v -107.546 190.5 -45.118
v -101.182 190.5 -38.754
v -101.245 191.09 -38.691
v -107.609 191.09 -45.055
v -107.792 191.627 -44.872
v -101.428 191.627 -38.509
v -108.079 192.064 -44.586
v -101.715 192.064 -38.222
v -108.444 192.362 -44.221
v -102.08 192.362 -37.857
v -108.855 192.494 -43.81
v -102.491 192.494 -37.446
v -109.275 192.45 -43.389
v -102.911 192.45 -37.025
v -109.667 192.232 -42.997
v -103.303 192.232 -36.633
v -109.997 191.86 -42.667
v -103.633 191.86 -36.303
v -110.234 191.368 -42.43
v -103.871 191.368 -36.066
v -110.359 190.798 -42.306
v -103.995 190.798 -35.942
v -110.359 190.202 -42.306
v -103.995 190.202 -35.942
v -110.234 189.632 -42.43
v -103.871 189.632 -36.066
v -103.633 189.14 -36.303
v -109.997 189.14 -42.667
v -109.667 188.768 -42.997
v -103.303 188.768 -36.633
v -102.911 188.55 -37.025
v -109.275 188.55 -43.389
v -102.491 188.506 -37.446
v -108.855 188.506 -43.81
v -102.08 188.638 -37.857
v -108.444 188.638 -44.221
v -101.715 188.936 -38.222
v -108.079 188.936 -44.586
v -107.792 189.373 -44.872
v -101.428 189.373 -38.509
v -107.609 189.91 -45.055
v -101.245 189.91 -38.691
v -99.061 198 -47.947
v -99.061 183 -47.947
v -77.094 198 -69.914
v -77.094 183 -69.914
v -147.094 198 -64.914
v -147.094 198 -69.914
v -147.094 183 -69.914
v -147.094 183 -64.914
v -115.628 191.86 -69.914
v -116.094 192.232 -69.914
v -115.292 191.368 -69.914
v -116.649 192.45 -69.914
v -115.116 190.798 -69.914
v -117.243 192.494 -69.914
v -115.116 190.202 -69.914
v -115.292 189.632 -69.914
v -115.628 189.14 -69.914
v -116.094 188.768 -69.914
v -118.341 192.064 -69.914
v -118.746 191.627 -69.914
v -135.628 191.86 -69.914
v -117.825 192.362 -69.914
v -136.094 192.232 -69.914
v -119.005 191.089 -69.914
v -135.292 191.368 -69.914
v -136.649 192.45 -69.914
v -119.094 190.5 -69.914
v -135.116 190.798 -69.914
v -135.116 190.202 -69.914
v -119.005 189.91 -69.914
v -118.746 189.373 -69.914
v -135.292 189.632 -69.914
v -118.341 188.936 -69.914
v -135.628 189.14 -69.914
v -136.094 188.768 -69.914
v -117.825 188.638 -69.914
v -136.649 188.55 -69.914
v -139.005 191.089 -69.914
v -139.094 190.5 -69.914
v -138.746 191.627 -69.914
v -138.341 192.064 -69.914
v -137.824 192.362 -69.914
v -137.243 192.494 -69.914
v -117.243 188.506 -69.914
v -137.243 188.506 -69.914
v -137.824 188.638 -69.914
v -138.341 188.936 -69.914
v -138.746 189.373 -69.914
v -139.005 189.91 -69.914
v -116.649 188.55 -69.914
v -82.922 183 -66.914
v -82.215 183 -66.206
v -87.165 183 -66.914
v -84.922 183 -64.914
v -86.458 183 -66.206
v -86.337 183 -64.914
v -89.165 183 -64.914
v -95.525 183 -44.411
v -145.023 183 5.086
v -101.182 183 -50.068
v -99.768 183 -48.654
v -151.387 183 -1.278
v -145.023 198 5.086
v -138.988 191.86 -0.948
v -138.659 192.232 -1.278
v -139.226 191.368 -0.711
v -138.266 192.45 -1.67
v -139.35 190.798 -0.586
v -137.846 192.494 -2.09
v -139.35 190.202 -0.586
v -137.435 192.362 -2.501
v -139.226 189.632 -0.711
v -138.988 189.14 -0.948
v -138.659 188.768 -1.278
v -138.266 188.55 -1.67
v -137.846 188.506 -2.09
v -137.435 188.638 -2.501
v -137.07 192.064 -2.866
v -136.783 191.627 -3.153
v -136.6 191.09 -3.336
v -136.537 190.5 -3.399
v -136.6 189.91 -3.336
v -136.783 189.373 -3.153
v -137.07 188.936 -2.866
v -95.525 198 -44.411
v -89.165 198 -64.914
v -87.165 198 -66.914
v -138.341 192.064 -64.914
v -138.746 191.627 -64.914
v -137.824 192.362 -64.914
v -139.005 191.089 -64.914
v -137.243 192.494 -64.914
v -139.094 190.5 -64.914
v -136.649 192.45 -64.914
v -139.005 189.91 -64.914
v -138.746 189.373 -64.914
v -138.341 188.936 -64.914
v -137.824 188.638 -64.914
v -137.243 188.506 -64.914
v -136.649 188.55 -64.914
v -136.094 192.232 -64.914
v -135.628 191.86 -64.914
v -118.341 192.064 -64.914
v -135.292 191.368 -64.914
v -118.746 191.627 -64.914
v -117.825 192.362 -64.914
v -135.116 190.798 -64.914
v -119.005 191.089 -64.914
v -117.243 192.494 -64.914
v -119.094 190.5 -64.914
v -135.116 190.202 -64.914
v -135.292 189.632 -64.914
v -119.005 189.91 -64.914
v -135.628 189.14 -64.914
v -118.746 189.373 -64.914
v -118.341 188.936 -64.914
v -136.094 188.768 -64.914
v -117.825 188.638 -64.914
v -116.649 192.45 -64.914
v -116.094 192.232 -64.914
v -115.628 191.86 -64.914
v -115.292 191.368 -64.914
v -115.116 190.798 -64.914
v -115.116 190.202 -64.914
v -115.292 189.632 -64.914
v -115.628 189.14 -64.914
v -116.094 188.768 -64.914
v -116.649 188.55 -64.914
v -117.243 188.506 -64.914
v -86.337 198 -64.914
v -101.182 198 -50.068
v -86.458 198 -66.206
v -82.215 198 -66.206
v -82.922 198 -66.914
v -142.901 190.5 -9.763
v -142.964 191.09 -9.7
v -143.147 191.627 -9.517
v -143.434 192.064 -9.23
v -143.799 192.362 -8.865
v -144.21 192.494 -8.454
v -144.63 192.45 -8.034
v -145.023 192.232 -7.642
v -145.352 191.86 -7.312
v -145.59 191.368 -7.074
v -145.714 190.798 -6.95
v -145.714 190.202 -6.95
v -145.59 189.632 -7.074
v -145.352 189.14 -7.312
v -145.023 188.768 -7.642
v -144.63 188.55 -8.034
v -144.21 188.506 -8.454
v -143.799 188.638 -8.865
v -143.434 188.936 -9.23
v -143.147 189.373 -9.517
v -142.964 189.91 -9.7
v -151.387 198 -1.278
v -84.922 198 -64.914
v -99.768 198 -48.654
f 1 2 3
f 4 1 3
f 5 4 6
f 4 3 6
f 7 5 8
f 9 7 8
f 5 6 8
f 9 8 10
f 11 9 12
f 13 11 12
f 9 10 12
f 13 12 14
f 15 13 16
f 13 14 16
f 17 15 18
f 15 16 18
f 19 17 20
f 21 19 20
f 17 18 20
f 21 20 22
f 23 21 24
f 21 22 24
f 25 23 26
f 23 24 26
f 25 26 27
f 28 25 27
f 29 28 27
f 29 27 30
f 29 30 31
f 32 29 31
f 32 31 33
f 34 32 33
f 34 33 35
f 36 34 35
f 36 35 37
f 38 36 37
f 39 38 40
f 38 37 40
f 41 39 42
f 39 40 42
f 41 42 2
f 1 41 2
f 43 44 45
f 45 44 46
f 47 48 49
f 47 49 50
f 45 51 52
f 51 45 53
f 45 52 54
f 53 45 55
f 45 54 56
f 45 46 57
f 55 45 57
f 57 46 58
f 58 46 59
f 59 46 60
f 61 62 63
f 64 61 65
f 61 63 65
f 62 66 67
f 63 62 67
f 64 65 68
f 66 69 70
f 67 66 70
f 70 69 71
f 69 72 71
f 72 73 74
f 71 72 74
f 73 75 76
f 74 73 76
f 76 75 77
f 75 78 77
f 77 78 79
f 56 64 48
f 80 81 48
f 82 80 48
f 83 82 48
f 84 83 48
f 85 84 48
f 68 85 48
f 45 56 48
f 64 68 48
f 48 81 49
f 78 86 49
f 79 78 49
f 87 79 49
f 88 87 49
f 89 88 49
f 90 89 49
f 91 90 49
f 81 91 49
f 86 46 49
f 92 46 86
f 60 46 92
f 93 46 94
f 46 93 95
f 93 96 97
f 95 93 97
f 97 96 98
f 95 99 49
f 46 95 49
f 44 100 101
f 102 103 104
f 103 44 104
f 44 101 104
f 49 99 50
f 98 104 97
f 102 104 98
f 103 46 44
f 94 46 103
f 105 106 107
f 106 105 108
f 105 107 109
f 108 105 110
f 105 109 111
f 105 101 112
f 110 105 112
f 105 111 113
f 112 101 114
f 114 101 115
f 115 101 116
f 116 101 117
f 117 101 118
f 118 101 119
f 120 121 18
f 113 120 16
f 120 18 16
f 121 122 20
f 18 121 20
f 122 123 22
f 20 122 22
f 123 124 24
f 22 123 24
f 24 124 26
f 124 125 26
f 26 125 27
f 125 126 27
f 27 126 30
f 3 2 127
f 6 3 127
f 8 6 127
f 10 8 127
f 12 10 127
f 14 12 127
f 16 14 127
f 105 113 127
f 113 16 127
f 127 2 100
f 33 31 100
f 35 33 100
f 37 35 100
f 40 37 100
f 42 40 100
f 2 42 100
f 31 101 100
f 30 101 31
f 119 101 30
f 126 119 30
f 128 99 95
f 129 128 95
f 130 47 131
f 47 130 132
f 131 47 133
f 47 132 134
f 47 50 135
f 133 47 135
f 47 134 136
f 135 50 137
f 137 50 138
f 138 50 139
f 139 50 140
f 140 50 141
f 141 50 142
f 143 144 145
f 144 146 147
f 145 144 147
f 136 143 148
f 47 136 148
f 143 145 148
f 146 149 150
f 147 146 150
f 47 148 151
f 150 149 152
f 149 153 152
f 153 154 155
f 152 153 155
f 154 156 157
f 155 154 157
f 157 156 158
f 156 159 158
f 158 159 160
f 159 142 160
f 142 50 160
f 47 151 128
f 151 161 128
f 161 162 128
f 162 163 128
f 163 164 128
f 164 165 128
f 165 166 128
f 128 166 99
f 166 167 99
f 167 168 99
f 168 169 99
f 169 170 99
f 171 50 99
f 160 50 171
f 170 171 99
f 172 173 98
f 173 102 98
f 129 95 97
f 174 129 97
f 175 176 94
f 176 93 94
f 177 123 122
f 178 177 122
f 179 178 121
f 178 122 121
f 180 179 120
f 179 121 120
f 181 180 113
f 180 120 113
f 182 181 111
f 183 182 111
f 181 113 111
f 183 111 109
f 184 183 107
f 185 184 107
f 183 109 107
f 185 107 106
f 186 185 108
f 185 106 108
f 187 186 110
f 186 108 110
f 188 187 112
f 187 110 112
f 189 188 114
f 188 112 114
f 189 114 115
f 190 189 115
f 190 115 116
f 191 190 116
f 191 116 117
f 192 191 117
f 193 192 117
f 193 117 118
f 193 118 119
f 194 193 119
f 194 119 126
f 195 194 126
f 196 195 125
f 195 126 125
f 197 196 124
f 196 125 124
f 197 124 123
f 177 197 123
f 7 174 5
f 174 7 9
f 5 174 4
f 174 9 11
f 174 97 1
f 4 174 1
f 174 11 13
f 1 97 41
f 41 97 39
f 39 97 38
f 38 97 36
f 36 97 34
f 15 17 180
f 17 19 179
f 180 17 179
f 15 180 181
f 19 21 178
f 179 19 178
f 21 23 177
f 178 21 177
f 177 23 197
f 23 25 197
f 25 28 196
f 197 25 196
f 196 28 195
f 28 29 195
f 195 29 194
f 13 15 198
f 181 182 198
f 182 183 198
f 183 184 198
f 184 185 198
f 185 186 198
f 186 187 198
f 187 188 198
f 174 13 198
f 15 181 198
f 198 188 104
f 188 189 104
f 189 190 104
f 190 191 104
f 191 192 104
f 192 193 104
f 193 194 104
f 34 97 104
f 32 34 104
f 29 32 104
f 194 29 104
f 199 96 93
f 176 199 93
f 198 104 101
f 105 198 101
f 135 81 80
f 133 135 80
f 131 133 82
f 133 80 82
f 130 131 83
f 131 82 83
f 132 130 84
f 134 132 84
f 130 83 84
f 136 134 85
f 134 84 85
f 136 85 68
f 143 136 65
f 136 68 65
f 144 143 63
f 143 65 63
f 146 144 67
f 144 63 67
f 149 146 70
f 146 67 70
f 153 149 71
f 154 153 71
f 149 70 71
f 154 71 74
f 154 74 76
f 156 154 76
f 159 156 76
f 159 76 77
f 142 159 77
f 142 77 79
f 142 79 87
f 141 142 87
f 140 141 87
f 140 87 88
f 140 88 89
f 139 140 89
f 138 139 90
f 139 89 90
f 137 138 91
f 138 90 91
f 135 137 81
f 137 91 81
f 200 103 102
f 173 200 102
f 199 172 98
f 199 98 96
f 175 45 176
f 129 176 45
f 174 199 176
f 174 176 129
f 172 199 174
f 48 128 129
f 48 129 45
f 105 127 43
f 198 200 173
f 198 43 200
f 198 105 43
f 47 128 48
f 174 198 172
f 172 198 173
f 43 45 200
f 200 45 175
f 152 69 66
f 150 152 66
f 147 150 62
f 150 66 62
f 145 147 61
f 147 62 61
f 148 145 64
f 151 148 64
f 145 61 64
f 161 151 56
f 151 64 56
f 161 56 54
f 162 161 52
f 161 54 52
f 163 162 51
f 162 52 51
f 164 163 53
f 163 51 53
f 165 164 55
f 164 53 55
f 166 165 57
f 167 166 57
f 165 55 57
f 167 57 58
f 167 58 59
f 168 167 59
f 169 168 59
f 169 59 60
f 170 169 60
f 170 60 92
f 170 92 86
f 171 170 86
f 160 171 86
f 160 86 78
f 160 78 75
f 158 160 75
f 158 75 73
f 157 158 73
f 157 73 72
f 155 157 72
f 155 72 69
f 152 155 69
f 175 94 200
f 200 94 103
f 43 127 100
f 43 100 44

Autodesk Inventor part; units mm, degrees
ref_plane "YZ Plane" through (0, 0, 0) normal (1, 0, 0) x (0, 1, 0)
ref_plane "XZ Plane" through (0, 0, 0) normal (0, 1, 0) x (-1, 0, 0)
ref_plane "XY Plane" through (0, 0, 0) normal (0, 0, 1) x (1, 0, 0)
sketch "Sketch1" plane through (475.3607, 0, -304.7358) normal (0, 1, 0) x (-1, 0, 0)
  line L0 (-230.3144, -553.6037) -> (1418.8804, 1095.5912)
  line L1 (1257.2358, 1257.2358) -> (0, 0)
  line L2 (0, 0) -> (143.6839, -143.6842)
  line L3 (1418.8804, 1095.5912) -> (1257.2358, 1257.2358)
  line L4 (143.684, -143.6842) -> (-233.396, -520.7642)
  line L5 (-338.0775, -553.6037) -> (107.7631, -107.763)
  line L6 (89.8025, -89.8027) -> (-468.1591, -647.7642)
  line L7 (-468.1591, -647.7642) -> (1309.841, -647.7642)
  line L8 (1309.841, -520.7642) -> (-161.5539, -520.7642)
  line L9 (-161.5539, -520.7642) -> (-212.3539, -571.5642)
  line L10 (-212.3539, -571.5642) -> (-230.3144, -553.6037)
  line L11 (-233.396, -520.7642) -> (-269.317, -520.7642)
  line L12 (-269.317, -520.7642) -> (-320.117, -571.5642)
  line L13 (-320.117, -571.5642) -> (-338.0775, -553.6037)
  line L14 (1309.841, -647.7642) -> (1309.841, -520.7642)
  line L15 (107.7631, -107.763) -> (143.684, -143.6842)
  line L16 (143.6839, -143.6842) -> (-233.396, -520.7642)
  line L17 (-233.396, -520.7642) -> (-269.317, -520.7642)
  line L18 (-269.317, -520.7642) -> (-320.117, -571.5642)
  line L19 (-320.117, -571.5642) -> (-338.0775, -553.6037)
  line L20 (-338.0775, -553.6037) -> (107.7629, -107.7632)
extrude "Extrusion1" add sketch "Sketch1" along normal blind 381
sketch "Sketch2" plane through (943.5197, 0, -952.5) normal (0, 0, -1) x (-1, 0, 0)
  circle A0 centre (1524, 190.5) radius 50.8
  circle A1 centre (1016, 190.5) radius 50.8
  line L0 (1778, 0) -> (1778, 381) projected
  line L1 (0, 381) -> (1778, 381) projected
  point P0 (0, -381)
  dimension "d6" = 101.6
  dimension "d3" = 101.6
  dimension "d5" = 508
  dimension "d4" = 0
  dimension "d8" = 254
  dimension "d7" = 190.5
extrude "Extrusion2" cut sketch "Sketch2" against normal up to surface (127 mm away)
scale "Scale1" factors (0.03937, 0.03937, 0.03937) then translate (-114.2403, 183, -32.4136) bodies 1
sketch "Sketch3" plane through (-95.5254, 183, -44.4111) normal (0.7071068, 0, 0.7071068) x (0.7071068, 0, -0.7071068)
  circle A0 centre (-59.9999, 7.5) radius 2
  circle A1 centre (-9.9999, 7.5) radius 2
  line L0 (-69.9999, 15) -> (0, 15) projected
  line L1 (-69.9999, 0) -> (-69.9999, 15) projected
  point P0 (36.1433, -183)
  dimension "d15" = 4
  dimension "d16" = 4
  dimension "d17" = 7.5
  dimension "d18" = 0
  dimension "d19" = 50
  dimension "d20" = 10
extrude "Extrusion3" cut sketch "Sketch3" against normal blind 10
properties part number "charge" material "ABS Plastic"
